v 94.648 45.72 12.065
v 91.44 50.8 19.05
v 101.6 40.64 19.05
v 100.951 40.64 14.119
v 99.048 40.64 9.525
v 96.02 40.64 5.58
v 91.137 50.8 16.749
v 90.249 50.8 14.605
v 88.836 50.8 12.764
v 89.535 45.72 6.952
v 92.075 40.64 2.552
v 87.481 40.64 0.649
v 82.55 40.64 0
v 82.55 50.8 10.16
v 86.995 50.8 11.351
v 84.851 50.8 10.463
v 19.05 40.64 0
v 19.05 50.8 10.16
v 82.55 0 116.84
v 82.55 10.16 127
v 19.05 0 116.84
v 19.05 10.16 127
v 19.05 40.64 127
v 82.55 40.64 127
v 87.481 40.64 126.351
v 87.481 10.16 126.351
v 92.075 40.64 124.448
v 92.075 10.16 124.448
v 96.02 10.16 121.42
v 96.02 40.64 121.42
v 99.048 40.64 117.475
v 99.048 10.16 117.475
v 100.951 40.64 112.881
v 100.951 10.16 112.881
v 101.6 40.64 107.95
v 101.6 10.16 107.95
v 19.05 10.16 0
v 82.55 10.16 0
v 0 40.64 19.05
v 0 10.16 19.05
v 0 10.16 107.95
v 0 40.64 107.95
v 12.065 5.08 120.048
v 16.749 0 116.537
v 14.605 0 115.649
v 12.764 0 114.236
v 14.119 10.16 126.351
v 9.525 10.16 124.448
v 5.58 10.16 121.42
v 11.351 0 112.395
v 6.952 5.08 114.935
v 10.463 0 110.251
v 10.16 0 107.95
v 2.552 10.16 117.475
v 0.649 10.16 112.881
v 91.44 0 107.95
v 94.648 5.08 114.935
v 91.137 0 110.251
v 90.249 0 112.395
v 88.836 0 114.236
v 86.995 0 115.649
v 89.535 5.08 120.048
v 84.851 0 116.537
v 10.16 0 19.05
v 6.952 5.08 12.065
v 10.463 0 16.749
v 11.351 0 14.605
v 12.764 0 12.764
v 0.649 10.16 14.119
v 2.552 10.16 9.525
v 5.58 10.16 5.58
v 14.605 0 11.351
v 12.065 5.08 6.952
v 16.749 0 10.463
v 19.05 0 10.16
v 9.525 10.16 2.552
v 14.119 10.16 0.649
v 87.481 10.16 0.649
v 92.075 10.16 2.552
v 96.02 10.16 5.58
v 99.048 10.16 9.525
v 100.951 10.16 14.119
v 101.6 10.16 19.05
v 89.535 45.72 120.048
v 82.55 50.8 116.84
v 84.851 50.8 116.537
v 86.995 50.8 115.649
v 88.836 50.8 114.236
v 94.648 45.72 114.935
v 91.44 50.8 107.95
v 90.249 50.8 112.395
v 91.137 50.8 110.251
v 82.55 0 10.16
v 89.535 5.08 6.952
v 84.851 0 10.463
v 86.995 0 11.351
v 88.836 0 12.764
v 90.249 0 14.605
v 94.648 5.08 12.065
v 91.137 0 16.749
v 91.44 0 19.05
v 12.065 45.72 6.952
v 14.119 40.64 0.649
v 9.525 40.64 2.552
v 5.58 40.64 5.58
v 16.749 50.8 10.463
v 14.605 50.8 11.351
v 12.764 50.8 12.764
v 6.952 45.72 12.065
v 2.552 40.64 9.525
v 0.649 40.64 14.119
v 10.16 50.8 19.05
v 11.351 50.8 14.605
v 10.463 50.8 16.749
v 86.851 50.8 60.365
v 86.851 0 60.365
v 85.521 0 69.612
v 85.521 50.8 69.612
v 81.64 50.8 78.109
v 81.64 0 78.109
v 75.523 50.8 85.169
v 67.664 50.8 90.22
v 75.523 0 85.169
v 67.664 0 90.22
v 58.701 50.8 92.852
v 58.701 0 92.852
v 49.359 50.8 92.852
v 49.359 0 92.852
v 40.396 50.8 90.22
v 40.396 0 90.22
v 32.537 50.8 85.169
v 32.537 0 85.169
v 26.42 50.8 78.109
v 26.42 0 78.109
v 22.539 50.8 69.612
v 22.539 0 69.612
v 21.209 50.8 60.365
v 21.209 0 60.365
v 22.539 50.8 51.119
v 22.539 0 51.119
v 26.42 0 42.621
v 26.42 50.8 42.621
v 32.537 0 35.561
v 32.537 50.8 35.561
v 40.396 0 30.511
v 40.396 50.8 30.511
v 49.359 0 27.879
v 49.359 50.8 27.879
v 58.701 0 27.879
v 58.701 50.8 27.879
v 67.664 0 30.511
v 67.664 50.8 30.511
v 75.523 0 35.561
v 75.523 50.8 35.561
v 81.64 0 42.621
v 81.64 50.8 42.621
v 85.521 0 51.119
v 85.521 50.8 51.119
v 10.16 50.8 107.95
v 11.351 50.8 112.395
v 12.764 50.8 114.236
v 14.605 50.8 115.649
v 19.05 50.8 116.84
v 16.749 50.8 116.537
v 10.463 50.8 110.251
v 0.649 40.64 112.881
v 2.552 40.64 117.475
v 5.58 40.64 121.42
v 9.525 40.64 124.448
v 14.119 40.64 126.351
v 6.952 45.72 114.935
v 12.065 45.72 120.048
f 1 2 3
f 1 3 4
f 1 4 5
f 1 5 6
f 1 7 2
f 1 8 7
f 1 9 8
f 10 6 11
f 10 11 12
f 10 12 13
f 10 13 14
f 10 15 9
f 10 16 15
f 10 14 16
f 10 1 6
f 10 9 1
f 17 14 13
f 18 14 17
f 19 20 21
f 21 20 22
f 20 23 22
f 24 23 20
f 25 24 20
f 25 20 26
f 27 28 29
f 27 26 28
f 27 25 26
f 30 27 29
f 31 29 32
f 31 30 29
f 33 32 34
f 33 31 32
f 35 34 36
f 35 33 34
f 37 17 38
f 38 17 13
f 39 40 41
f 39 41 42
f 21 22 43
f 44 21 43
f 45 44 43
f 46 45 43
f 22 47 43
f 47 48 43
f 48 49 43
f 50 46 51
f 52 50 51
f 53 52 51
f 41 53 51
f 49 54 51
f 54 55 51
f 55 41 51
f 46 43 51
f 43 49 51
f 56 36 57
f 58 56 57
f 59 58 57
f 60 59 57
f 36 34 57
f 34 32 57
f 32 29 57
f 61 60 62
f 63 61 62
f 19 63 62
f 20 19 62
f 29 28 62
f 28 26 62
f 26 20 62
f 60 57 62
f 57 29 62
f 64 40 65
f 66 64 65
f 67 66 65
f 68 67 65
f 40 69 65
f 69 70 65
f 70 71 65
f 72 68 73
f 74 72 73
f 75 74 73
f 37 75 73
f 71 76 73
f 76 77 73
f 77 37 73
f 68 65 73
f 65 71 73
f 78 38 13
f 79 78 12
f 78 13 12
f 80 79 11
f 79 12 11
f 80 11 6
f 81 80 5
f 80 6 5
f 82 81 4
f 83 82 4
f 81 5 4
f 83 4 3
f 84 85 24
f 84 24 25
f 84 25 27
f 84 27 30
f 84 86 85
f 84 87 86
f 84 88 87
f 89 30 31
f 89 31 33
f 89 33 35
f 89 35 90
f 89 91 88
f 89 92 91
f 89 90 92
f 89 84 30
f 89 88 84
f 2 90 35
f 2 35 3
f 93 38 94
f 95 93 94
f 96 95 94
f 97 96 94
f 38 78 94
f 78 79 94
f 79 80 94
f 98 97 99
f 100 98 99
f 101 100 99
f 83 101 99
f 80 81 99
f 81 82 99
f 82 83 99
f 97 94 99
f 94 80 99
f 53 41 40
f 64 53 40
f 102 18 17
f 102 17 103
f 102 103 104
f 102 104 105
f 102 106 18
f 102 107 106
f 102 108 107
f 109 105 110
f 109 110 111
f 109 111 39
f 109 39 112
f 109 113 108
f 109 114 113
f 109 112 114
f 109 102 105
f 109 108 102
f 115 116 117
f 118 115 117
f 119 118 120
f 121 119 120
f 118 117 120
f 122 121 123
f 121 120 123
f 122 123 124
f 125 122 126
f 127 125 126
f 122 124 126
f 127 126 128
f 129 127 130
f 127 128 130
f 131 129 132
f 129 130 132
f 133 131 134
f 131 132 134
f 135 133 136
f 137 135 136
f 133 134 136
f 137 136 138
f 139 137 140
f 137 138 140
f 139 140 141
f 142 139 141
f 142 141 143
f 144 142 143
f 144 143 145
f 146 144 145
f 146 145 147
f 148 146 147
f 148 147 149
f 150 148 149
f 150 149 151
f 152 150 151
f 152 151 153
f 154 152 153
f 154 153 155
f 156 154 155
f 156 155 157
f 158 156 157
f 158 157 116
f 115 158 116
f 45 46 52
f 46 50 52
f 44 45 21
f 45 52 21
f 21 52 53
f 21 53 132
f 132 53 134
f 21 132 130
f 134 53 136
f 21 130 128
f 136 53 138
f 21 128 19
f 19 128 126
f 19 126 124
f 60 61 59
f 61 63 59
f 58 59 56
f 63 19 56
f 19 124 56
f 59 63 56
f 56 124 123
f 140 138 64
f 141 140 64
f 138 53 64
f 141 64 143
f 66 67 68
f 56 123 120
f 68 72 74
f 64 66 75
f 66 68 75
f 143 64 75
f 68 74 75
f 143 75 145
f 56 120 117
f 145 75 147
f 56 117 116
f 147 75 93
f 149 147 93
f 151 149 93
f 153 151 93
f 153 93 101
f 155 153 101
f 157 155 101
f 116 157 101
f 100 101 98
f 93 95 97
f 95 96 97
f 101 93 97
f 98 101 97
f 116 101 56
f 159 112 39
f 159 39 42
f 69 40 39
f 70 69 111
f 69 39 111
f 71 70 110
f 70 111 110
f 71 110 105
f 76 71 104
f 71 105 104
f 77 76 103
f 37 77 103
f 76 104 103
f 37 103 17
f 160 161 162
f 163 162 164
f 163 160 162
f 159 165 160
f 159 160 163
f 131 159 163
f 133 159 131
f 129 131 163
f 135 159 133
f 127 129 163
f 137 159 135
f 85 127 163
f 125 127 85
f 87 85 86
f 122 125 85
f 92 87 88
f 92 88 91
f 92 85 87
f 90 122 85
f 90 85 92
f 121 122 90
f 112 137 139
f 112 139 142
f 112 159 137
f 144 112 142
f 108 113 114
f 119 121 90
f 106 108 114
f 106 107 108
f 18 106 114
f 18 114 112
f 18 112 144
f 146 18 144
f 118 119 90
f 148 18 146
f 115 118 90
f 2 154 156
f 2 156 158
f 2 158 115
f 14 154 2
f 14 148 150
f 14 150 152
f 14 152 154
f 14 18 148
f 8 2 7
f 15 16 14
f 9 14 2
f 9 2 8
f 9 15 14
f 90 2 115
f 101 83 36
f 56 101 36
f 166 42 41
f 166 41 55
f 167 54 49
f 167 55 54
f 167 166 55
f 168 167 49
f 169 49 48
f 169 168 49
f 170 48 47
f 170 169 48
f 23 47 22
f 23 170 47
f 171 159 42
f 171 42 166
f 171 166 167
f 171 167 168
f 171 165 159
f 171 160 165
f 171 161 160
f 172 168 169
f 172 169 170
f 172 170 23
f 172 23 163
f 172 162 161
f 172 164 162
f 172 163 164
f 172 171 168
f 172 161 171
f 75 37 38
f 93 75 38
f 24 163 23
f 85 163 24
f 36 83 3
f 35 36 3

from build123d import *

# Parameters (mm, degrees)
F0_W     = 101.6
F0_H     = 50.8
F1_DEPTH = 127
F2_R     = 32.820623
F3_DEPTH = 120.243898
F4_R     = 19.05
F5_SIZE2 = 10.16
F5_SIZE  = 10.16


with BuildPart() as f1:
    # F0 (on Top) → F1 (new body)
    with BuildSketch(Plane.XY):
        with Locations((50.8, 25.4)):
            Rectangle(F0_W, F0_H)
    extrude(amount=F1_DEPTH)

    # F2 (on face) → F3 (cut)
    with BuildSketch(Plane.XZ):
        with Locations((54.029975, 60.365319)):
            Circle(F2_R)
    extrude(amount=-F3_DEPTH, mode=Mode.SUBTRACT)

    # F4
    f4_edges = [f1.edges().sort_by_distance(p)[0] for p in [
        (101.6, 25.4, 127),
        (0, 25.4, 127),
        (101.6, 25.4, 0),
        (0, 25.4, 0),
    ]]
    fillet(f4_edges, radius=F4_R)

    # F5
    f5_edges = [f1.edges().sort_by_distance(p)[0] for p in [
        (101.6, 0, 63.5),
        (0, 50.8, 63.5),
    ]]
    chamfer(f5_edges, length=F5_SIZE, length2=F5_SIZE2)


solid = f1.part
